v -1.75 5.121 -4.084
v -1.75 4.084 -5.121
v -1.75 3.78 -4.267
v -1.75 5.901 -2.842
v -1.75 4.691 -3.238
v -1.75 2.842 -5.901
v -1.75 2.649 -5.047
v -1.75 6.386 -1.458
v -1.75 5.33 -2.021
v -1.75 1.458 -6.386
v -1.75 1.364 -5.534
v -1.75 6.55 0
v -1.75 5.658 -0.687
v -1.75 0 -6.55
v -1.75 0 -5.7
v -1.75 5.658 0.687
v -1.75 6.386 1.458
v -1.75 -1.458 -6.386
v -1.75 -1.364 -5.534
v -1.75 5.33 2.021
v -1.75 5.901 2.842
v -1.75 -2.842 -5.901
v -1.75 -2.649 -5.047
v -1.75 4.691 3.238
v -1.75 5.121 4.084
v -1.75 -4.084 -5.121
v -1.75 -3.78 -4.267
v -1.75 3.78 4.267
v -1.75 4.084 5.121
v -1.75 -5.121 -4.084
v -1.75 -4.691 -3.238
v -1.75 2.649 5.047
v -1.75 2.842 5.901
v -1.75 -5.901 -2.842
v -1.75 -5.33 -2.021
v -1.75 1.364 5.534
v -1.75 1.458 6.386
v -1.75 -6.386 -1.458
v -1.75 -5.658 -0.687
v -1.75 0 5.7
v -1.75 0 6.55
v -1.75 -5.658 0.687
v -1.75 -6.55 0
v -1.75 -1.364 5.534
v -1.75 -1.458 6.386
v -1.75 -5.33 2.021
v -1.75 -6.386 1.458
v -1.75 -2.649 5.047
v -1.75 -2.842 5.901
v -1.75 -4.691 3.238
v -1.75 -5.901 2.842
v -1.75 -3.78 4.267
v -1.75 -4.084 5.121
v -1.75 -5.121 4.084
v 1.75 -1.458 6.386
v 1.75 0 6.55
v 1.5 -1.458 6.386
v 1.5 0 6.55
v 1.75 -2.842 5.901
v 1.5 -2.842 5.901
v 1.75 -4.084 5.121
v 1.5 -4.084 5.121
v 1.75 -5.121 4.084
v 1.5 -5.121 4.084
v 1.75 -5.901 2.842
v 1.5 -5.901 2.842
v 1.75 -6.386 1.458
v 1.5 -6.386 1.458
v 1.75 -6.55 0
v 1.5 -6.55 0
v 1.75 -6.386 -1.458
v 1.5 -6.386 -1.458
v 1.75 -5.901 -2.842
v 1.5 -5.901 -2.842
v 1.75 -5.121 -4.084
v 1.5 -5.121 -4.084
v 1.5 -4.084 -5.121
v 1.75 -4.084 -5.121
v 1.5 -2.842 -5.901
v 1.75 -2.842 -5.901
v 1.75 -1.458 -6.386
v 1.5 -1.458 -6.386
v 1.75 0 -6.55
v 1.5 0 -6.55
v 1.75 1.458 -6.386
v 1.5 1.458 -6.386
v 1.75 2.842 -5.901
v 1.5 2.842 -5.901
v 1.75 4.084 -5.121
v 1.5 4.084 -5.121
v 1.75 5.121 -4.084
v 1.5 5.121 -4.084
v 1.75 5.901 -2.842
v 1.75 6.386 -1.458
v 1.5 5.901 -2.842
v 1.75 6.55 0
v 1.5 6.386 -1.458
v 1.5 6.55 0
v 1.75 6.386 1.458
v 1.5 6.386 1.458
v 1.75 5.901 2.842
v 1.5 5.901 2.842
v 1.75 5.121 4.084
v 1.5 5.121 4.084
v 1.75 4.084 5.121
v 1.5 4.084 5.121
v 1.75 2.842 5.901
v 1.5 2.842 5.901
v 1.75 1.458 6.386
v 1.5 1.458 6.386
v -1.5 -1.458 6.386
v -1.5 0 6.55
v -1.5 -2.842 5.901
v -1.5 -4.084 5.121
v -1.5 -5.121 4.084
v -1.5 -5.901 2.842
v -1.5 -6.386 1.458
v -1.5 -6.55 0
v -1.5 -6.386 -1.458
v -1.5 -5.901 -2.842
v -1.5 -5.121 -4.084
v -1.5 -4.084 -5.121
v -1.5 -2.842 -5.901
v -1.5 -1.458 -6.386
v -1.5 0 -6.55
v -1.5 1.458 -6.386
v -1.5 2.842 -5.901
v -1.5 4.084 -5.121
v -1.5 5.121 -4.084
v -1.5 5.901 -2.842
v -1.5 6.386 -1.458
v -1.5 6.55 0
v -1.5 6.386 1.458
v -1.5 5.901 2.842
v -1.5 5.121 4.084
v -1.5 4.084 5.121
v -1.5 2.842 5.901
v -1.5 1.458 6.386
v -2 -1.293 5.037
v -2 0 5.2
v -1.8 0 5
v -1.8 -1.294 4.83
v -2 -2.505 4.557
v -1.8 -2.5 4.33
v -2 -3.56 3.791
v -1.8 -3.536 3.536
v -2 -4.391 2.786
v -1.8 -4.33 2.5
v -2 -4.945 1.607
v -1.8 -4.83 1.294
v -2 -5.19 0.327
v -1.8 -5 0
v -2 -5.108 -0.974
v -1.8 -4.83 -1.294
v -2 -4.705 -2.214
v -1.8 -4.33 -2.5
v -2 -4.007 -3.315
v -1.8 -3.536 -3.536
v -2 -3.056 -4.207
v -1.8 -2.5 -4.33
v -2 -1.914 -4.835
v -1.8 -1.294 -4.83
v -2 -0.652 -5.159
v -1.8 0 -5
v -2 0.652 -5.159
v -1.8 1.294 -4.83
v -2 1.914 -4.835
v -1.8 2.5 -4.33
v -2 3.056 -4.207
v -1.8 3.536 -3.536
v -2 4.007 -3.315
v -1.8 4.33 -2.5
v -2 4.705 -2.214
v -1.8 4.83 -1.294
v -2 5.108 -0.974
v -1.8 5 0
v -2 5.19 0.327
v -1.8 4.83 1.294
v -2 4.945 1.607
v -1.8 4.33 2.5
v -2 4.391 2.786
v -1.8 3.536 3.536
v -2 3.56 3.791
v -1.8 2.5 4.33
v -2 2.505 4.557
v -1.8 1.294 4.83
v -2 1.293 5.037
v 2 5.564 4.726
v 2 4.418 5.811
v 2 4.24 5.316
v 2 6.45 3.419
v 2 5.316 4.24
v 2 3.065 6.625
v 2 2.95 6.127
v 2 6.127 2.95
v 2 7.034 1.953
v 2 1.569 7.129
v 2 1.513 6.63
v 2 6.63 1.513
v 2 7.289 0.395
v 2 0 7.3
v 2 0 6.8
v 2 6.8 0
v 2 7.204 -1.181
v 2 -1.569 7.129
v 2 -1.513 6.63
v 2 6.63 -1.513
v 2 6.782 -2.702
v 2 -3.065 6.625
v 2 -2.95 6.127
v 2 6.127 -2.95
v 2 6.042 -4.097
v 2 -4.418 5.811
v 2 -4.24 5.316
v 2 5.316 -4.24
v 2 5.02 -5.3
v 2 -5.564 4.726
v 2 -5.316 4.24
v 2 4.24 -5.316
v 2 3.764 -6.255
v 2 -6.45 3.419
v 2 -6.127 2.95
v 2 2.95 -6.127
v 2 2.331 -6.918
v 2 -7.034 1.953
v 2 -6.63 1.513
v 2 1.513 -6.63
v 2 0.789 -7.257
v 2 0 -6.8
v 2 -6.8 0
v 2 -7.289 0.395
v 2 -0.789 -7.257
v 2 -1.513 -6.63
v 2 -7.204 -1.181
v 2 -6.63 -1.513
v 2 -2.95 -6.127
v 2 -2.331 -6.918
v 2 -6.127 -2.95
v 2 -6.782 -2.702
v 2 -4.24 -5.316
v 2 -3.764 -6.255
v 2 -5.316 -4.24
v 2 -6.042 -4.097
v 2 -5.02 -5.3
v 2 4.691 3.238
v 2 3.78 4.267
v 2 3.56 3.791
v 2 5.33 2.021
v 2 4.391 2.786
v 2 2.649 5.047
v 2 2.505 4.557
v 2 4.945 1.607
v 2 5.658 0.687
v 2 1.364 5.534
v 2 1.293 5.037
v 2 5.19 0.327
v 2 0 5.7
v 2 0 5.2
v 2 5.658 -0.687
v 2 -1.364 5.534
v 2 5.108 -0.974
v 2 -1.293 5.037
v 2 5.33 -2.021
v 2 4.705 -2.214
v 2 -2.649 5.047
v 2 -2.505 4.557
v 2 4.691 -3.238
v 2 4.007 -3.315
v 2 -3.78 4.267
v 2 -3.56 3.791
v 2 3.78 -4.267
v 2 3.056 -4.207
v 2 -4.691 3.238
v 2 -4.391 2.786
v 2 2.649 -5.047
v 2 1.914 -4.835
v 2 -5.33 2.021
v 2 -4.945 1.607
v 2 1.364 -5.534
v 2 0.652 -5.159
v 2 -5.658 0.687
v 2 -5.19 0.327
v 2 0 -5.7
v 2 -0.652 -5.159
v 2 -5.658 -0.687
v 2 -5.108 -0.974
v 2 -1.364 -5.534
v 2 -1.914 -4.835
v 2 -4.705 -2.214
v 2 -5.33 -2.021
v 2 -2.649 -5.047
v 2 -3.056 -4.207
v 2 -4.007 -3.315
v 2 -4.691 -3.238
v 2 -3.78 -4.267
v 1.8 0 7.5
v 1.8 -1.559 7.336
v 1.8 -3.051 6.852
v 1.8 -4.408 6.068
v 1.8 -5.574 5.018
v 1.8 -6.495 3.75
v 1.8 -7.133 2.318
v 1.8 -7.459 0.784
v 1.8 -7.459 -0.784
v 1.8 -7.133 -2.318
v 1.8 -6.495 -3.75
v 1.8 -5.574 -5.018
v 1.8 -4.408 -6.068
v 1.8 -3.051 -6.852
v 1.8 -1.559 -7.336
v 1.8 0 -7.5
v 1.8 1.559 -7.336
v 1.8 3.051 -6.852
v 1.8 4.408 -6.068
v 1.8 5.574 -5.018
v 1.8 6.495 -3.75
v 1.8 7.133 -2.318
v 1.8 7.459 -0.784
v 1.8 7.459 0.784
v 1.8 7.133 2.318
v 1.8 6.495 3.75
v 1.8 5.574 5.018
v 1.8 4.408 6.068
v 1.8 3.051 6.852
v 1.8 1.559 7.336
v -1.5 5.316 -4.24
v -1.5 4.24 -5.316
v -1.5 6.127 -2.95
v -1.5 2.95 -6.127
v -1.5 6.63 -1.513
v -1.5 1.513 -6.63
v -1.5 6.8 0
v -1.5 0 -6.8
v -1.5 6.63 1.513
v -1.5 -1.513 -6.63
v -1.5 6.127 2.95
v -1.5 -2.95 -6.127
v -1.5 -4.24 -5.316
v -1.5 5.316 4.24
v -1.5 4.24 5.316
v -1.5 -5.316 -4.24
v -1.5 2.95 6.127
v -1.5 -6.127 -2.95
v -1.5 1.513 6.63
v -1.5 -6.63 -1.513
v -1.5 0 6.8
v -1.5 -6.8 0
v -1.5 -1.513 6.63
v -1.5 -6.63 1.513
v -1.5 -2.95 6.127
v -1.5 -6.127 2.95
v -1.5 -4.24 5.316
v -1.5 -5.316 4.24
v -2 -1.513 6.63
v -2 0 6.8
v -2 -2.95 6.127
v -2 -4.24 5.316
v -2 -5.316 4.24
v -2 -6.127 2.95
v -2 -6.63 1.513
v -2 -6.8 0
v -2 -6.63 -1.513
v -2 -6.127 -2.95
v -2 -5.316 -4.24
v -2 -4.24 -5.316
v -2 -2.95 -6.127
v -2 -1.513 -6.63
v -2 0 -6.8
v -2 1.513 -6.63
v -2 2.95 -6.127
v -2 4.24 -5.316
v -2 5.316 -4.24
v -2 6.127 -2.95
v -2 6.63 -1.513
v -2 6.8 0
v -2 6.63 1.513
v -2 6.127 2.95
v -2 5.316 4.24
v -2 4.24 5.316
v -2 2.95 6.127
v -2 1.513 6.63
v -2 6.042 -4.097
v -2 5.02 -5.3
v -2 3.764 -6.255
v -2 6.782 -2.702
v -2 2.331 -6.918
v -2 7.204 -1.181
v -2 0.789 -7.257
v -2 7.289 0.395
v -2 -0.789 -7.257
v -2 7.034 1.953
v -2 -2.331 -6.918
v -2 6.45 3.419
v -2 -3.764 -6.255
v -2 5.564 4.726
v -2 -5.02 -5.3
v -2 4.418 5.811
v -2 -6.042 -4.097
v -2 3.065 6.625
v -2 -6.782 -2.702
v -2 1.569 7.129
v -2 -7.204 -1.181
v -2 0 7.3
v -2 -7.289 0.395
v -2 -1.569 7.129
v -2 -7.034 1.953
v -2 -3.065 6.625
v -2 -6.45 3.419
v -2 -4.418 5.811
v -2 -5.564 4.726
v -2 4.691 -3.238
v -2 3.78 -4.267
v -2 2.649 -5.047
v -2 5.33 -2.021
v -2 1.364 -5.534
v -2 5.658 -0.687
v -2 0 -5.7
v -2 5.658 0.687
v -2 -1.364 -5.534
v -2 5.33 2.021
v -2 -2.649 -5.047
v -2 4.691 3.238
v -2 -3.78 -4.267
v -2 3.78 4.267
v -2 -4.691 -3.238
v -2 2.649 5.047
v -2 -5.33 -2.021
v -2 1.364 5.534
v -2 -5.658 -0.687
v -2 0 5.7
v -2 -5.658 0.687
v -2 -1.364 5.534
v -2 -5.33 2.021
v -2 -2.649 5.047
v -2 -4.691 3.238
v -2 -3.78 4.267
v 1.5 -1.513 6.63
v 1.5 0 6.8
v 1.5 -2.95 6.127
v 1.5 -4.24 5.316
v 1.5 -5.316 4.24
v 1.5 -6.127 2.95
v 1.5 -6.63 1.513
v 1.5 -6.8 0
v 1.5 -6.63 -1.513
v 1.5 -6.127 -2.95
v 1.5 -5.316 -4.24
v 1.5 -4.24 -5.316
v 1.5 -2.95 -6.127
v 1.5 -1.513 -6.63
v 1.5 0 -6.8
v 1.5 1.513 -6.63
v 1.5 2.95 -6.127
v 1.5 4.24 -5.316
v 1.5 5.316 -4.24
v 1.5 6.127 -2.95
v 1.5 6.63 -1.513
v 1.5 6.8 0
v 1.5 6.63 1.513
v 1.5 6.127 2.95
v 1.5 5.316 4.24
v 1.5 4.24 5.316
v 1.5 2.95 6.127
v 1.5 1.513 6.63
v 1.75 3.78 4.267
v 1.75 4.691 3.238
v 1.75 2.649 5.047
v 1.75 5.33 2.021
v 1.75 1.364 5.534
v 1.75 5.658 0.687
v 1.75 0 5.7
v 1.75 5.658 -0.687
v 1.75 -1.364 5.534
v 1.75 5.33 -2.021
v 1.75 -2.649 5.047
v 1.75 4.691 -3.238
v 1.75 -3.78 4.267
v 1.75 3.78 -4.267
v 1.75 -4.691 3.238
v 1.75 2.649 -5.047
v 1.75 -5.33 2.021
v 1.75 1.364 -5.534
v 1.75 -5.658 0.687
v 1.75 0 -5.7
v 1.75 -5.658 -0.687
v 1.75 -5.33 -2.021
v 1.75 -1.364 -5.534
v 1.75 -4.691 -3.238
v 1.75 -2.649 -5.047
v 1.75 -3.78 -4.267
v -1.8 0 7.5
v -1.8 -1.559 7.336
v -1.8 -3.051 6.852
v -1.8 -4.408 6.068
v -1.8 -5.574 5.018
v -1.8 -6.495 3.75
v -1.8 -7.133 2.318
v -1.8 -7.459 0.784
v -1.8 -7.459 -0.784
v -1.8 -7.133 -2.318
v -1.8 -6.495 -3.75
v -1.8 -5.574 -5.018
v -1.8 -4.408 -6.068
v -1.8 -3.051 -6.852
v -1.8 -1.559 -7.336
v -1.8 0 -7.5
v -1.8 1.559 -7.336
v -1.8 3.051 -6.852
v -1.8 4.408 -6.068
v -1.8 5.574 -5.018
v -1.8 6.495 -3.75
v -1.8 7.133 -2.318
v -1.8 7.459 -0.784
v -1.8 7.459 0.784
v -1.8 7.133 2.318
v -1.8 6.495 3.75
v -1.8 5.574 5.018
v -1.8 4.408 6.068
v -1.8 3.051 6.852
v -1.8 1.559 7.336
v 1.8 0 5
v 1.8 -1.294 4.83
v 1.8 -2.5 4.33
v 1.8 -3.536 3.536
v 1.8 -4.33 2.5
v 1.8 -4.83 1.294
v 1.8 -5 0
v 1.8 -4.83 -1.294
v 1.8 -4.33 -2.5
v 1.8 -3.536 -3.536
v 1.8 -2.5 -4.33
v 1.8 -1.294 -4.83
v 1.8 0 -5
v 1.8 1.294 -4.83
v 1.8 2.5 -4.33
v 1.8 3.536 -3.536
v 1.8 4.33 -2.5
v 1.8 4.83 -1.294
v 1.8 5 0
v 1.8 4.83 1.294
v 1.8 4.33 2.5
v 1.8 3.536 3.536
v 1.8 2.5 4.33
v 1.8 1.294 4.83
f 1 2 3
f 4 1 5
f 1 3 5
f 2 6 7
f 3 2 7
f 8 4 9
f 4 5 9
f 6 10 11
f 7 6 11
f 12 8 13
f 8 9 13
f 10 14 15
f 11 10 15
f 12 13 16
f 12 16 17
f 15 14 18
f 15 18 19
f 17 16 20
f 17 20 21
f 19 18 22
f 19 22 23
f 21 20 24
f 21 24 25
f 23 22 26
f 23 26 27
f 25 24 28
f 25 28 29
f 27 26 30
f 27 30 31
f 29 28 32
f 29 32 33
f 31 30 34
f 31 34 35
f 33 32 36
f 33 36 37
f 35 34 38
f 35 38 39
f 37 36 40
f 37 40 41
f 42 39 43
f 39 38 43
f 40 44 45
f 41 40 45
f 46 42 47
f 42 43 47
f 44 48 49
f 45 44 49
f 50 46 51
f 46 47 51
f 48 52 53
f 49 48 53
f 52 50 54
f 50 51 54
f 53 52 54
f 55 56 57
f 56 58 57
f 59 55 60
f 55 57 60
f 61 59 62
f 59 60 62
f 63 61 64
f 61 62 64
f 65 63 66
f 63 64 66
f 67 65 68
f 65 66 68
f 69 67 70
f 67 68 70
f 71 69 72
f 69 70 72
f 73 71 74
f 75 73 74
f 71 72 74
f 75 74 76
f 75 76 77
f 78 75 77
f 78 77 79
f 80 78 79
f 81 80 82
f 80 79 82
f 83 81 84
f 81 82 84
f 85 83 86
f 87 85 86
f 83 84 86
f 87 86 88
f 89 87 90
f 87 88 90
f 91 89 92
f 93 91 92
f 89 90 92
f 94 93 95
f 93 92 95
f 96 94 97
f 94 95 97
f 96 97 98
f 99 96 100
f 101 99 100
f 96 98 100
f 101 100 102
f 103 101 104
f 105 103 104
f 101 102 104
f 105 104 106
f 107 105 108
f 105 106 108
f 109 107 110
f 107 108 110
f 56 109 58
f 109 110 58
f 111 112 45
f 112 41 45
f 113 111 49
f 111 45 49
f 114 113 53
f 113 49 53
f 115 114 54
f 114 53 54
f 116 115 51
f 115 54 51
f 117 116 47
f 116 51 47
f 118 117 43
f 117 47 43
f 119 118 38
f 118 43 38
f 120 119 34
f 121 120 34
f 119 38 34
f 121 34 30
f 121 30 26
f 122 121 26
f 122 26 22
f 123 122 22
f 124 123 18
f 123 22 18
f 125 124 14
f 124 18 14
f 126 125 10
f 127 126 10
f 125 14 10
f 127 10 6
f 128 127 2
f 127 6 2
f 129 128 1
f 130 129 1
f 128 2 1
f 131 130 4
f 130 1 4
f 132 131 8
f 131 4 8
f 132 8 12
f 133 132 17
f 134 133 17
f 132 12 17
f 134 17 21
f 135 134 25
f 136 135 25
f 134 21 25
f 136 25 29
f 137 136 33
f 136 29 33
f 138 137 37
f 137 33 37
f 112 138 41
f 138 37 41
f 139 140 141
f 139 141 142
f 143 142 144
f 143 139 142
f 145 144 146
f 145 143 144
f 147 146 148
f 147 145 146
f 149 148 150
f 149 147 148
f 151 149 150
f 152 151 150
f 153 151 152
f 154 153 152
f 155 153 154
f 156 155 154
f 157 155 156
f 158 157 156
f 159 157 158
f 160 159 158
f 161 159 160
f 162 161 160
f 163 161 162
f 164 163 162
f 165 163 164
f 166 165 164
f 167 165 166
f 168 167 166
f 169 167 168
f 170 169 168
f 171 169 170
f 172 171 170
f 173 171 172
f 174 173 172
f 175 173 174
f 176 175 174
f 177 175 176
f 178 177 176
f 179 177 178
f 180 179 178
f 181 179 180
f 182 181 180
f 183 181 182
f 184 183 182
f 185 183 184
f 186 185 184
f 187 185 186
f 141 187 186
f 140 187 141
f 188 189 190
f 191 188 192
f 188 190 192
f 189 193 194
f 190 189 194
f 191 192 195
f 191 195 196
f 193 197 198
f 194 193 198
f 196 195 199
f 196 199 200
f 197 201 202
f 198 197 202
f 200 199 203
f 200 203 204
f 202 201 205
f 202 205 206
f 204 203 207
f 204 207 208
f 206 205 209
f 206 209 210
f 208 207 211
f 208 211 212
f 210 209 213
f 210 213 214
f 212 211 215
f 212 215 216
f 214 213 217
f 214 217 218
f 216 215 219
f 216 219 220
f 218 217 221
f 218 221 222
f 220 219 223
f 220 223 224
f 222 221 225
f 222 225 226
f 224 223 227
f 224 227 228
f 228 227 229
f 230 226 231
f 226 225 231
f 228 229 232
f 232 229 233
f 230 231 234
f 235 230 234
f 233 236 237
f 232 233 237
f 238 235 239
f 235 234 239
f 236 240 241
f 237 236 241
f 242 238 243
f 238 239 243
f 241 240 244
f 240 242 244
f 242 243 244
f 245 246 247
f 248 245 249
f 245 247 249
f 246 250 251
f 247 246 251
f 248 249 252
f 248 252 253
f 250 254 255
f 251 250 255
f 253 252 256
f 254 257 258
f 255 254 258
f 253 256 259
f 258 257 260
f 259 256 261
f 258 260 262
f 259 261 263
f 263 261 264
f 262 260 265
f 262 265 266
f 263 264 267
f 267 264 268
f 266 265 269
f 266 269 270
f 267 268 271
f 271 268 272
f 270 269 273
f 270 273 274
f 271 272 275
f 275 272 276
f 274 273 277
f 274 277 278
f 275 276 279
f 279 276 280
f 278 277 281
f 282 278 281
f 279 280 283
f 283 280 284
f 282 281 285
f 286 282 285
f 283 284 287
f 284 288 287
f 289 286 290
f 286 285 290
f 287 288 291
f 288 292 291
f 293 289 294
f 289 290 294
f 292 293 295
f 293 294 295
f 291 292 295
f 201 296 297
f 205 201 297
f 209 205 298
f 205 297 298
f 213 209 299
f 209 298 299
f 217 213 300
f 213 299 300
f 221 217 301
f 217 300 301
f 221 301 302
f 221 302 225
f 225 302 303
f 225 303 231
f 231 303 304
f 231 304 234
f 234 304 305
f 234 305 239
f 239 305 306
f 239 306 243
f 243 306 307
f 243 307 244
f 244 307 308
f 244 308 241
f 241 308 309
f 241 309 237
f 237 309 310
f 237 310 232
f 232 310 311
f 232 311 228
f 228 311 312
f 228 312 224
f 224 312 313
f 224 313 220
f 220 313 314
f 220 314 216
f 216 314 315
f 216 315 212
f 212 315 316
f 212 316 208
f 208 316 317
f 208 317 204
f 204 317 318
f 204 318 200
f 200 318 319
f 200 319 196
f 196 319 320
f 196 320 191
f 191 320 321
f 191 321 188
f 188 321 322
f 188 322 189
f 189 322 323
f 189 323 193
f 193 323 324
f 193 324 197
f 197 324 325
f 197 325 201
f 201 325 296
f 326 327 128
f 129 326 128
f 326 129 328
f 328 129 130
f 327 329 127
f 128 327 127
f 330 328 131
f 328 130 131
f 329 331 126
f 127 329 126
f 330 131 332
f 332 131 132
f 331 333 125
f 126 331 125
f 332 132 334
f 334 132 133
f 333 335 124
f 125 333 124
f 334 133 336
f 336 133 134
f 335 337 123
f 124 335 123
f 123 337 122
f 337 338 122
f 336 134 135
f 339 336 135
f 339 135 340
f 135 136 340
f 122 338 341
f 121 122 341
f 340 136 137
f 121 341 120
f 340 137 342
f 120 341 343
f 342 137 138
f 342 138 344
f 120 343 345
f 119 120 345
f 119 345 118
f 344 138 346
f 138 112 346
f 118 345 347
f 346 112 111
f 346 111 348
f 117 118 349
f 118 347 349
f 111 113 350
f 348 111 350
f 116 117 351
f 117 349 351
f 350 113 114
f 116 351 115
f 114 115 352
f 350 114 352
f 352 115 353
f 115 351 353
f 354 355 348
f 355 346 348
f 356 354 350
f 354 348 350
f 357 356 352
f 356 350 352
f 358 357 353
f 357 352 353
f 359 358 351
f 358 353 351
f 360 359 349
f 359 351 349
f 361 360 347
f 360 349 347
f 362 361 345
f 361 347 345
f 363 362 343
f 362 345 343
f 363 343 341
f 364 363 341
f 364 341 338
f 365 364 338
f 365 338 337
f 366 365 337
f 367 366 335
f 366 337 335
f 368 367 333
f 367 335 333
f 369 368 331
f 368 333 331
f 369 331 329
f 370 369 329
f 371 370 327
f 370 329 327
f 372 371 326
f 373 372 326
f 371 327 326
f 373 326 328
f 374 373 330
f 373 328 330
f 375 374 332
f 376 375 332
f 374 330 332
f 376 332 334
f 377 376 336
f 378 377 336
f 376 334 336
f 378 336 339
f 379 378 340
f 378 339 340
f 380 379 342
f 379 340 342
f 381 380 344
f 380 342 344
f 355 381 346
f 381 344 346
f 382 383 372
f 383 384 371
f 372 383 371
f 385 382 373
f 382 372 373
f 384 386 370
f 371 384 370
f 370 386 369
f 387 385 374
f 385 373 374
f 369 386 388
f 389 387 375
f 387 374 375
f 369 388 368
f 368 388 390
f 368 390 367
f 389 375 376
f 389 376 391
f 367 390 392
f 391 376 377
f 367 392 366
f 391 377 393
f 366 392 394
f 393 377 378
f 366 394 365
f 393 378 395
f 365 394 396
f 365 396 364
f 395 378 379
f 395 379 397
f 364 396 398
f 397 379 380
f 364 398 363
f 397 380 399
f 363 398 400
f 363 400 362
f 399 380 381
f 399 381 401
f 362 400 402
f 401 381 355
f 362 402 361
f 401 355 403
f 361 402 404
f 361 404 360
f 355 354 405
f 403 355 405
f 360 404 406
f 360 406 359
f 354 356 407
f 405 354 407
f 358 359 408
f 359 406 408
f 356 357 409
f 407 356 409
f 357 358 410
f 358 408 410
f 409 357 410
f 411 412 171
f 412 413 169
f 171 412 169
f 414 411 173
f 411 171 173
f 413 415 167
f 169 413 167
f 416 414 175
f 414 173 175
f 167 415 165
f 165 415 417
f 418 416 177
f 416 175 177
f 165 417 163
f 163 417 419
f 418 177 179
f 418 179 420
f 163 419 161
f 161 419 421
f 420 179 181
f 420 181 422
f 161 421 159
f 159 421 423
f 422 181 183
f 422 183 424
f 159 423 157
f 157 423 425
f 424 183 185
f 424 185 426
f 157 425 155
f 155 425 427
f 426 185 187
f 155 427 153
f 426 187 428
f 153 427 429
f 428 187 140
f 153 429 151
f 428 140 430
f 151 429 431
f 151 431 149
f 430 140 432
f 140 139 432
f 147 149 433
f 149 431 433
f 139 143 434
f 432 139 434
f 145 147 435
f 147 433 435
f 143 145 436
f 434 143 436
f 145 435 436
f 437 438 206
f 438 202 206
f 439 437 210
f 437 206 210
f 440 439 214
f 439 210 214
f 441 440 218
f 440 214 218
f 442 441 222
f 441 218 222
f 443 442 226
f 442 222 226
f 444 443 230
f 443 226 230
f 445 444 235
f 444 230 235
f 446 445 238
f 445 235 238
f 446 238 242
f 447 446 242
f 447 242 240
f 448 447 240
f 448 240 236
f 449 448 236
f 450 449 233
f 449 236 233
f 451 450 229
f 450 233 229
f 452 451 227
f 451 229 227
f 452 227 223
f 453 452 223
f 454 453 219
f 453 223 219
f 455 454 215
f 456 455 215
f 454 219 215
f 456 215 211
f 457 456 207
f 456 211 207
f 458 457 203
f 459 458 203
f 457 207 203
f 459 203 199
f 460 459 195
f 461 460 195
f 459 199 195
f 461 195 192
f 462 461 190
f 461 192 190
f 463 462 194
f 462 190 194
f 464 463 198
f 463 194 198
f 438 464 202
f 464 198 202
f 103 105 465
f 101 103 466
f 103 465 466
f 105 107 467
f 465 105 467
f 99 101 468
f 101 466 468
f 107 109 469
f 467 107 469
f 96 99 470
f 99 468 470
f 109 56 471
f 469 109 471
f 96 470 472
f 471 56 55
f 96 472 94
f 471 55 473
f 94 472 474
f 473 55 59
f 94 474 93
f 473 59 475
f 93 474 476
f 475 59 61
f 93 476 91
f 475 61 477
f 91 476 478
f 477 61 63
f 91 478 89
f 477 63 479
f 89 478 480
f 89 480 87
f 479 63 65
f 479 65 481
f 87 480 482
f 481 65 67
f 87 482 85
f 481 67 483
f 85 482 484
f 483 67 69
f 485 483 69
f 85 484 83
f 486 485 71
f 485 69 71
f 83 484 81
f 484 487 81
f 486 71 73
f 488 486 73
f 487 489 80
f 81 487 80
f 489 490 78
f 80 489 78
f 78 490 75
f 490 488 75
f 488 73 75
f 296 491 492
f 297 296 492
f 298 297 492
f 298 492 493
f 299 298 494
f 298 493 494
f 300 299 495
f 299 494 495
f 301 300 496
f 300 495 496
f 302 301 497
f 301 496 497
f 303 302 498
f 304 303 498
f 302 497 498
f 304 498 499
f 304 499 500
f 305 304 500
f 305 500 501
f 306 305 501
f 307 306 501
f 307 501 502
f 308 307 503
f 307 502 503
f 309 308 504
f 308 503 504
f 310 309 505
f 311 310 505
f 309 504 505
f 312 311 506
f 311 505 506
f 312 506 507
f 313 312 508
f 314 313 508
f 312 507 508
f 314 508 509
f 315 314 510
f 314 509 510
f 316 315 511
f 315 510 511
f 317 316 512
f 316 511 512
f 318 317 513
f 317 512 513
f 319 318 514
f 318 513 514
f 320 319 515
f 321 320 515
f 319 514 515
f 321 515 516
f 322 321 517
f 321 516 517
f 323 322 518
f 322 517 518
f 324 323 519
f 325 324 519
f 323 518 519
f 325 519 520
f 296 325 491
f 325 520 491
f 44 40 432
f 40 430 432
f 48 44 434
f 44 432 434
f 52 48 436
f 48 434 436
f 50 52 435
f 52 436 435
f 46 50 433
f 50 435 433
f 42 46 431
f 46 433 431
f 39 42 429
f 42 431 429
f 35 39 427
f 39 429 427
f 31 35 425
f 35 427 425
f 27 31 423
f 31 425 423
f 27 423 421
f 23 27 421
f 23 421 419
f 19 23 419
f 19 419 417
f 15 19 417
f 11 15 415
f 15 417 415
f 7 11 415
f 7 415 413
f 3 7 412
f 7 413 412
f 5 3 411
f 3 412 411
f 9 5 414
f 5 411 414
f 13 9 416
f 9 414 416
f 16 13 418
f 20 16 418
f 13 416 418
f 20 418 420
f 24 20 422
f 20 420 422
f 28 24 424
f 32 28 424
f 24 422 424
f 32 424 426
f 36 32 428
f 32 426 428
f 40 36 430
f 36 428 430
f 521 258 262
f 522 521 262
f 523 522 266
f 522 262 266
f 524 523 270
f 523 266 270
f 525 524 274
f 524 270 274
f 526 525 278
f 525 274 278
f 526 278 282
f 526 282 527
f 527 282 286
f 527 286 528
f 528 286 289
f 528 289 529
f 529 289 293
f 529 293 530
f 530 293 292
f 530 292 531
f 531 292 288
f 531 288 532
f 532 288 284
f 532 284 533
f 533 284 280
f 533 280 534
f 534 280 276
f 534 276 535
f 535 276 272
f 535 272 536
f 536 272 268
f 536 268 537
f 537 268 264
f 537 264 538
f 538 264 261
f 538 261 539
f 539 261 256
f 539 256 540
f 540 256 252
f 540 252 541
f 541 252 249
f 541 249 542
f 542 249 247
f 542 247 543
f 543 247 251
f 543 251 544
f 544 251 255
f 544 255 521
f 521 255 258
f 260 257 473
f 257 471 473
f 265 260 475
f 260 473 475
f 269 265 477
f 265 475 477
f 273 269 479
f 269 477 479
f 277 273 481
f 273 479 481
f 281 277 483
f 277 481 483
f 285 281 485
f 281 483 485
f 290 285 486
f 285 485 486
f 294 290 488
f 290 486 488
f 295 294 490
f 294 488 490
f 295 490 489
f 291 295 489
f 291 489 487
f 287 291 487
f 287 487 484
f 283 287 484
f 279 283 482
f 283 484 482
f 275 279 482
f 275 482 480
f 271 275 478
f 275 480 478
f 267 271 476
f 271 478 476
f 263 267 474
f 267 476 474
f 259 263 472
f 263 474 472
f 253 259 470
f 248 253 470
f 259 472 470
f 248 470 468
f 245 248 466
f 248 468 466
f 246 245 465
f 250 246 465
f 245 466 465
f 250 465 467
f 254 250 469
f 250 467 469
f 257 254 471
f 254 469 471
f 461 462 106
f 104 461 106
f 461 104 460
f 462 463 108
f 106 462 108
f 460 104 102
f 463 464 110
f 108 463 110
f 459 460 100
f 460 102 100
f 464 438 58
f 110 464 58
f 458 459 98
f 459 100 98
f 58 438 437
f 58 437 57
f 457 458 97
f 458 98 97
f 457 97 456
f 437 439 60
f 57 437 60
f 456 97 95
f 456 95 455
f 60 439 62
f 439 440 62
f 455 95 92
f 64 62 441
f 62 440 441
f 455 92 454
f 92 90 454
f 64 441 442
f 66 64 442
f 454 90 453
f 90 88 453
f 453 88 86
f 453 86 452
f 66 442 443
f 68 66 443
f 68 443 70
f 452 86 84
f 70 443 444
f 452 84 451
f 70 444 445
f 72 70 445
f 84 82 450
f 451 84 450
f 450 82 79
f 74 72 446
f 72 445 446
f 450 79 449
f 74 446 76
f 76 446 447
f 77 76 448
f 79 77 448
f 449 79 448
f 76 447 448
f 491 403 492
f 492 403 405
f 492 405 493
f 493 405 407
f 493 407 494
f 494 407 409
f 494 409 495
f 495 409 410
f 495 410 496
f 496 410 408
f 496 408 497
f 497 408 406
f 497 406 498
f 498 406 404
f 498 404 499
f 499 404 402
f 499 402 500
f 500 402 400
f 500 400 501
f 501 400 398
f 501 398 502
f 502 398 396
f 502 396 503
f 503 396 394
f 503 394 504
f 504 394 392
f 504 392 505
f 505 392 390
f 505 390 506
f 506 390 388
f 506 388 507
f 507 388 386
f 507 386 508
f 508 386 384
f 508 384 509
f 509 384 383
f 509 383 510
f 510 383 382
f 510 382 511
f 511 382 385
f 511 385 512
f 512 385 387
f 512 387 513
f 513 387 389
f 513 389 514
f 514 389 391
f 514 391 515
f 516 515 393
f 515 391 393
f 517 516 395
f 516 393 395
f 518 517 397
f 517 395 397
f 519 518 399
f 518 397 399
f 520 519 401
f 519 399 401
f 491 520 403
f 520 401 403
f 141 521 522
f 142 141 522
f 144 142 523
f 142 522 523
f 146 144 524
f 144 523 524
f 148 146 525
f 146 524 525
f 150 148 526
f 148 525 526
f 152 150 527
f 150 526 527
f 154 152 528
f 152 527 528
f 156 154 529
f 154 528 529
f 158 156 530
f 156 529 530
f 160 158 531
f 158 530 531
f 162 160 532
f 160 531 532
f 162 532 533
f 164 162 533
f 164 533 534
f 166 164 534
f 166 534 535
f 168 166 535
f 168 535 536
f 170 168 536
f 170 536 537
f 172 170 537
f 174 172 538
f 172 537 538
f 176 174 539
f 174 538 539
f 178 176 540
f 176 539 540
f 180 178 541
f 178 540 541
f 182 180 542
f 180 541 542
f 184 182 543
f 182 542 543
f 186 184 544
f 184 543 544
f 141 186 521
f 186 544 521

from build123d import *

# Parameters (mm, degrees)
CHAMFER_1_SIZE = 0.2


with BuildPart() as part:
    # 草图1 → 旋转1 (revolve)
    with BuildSketch(Plane.XY, mode=Mode.PRIVATE) as revolve_1_sk:
        Polygon((-2, 5), (2, 5), (2, 5.7), (1.75, 5.7), (1.75, 6.55), (1.5, 6.55), (1.5, 6.8), (2, 6.8), (2, 7.5), (-2, 7.5), (-2, 6.8), (-1.5, 6.8), (-1.5, 6.55), (-1.75, 6.55), (-1.75, 5.7), (-2, 5.7), align=None)
    revolve(revolve_1_sk.sketch.rotate(Axis((-3.90102381, 0, 0), (1, 0, 0)), 90), axis=Axis((-3.90102381, 0, 0), (1, 0, 0)))

    # 倒角1
    chamfer_1_edges = [part.edges().sort_by_distance(p)[0] for p in [
        (-2, 0, -7.5),
        (2, 0, -7.5),
        (2, 0, -5),
        (-2, 0, -5),
    ]]
    chamfer(chamfer_1_edges, length=CHAMFER_1_SIZE)


solid = part.part
